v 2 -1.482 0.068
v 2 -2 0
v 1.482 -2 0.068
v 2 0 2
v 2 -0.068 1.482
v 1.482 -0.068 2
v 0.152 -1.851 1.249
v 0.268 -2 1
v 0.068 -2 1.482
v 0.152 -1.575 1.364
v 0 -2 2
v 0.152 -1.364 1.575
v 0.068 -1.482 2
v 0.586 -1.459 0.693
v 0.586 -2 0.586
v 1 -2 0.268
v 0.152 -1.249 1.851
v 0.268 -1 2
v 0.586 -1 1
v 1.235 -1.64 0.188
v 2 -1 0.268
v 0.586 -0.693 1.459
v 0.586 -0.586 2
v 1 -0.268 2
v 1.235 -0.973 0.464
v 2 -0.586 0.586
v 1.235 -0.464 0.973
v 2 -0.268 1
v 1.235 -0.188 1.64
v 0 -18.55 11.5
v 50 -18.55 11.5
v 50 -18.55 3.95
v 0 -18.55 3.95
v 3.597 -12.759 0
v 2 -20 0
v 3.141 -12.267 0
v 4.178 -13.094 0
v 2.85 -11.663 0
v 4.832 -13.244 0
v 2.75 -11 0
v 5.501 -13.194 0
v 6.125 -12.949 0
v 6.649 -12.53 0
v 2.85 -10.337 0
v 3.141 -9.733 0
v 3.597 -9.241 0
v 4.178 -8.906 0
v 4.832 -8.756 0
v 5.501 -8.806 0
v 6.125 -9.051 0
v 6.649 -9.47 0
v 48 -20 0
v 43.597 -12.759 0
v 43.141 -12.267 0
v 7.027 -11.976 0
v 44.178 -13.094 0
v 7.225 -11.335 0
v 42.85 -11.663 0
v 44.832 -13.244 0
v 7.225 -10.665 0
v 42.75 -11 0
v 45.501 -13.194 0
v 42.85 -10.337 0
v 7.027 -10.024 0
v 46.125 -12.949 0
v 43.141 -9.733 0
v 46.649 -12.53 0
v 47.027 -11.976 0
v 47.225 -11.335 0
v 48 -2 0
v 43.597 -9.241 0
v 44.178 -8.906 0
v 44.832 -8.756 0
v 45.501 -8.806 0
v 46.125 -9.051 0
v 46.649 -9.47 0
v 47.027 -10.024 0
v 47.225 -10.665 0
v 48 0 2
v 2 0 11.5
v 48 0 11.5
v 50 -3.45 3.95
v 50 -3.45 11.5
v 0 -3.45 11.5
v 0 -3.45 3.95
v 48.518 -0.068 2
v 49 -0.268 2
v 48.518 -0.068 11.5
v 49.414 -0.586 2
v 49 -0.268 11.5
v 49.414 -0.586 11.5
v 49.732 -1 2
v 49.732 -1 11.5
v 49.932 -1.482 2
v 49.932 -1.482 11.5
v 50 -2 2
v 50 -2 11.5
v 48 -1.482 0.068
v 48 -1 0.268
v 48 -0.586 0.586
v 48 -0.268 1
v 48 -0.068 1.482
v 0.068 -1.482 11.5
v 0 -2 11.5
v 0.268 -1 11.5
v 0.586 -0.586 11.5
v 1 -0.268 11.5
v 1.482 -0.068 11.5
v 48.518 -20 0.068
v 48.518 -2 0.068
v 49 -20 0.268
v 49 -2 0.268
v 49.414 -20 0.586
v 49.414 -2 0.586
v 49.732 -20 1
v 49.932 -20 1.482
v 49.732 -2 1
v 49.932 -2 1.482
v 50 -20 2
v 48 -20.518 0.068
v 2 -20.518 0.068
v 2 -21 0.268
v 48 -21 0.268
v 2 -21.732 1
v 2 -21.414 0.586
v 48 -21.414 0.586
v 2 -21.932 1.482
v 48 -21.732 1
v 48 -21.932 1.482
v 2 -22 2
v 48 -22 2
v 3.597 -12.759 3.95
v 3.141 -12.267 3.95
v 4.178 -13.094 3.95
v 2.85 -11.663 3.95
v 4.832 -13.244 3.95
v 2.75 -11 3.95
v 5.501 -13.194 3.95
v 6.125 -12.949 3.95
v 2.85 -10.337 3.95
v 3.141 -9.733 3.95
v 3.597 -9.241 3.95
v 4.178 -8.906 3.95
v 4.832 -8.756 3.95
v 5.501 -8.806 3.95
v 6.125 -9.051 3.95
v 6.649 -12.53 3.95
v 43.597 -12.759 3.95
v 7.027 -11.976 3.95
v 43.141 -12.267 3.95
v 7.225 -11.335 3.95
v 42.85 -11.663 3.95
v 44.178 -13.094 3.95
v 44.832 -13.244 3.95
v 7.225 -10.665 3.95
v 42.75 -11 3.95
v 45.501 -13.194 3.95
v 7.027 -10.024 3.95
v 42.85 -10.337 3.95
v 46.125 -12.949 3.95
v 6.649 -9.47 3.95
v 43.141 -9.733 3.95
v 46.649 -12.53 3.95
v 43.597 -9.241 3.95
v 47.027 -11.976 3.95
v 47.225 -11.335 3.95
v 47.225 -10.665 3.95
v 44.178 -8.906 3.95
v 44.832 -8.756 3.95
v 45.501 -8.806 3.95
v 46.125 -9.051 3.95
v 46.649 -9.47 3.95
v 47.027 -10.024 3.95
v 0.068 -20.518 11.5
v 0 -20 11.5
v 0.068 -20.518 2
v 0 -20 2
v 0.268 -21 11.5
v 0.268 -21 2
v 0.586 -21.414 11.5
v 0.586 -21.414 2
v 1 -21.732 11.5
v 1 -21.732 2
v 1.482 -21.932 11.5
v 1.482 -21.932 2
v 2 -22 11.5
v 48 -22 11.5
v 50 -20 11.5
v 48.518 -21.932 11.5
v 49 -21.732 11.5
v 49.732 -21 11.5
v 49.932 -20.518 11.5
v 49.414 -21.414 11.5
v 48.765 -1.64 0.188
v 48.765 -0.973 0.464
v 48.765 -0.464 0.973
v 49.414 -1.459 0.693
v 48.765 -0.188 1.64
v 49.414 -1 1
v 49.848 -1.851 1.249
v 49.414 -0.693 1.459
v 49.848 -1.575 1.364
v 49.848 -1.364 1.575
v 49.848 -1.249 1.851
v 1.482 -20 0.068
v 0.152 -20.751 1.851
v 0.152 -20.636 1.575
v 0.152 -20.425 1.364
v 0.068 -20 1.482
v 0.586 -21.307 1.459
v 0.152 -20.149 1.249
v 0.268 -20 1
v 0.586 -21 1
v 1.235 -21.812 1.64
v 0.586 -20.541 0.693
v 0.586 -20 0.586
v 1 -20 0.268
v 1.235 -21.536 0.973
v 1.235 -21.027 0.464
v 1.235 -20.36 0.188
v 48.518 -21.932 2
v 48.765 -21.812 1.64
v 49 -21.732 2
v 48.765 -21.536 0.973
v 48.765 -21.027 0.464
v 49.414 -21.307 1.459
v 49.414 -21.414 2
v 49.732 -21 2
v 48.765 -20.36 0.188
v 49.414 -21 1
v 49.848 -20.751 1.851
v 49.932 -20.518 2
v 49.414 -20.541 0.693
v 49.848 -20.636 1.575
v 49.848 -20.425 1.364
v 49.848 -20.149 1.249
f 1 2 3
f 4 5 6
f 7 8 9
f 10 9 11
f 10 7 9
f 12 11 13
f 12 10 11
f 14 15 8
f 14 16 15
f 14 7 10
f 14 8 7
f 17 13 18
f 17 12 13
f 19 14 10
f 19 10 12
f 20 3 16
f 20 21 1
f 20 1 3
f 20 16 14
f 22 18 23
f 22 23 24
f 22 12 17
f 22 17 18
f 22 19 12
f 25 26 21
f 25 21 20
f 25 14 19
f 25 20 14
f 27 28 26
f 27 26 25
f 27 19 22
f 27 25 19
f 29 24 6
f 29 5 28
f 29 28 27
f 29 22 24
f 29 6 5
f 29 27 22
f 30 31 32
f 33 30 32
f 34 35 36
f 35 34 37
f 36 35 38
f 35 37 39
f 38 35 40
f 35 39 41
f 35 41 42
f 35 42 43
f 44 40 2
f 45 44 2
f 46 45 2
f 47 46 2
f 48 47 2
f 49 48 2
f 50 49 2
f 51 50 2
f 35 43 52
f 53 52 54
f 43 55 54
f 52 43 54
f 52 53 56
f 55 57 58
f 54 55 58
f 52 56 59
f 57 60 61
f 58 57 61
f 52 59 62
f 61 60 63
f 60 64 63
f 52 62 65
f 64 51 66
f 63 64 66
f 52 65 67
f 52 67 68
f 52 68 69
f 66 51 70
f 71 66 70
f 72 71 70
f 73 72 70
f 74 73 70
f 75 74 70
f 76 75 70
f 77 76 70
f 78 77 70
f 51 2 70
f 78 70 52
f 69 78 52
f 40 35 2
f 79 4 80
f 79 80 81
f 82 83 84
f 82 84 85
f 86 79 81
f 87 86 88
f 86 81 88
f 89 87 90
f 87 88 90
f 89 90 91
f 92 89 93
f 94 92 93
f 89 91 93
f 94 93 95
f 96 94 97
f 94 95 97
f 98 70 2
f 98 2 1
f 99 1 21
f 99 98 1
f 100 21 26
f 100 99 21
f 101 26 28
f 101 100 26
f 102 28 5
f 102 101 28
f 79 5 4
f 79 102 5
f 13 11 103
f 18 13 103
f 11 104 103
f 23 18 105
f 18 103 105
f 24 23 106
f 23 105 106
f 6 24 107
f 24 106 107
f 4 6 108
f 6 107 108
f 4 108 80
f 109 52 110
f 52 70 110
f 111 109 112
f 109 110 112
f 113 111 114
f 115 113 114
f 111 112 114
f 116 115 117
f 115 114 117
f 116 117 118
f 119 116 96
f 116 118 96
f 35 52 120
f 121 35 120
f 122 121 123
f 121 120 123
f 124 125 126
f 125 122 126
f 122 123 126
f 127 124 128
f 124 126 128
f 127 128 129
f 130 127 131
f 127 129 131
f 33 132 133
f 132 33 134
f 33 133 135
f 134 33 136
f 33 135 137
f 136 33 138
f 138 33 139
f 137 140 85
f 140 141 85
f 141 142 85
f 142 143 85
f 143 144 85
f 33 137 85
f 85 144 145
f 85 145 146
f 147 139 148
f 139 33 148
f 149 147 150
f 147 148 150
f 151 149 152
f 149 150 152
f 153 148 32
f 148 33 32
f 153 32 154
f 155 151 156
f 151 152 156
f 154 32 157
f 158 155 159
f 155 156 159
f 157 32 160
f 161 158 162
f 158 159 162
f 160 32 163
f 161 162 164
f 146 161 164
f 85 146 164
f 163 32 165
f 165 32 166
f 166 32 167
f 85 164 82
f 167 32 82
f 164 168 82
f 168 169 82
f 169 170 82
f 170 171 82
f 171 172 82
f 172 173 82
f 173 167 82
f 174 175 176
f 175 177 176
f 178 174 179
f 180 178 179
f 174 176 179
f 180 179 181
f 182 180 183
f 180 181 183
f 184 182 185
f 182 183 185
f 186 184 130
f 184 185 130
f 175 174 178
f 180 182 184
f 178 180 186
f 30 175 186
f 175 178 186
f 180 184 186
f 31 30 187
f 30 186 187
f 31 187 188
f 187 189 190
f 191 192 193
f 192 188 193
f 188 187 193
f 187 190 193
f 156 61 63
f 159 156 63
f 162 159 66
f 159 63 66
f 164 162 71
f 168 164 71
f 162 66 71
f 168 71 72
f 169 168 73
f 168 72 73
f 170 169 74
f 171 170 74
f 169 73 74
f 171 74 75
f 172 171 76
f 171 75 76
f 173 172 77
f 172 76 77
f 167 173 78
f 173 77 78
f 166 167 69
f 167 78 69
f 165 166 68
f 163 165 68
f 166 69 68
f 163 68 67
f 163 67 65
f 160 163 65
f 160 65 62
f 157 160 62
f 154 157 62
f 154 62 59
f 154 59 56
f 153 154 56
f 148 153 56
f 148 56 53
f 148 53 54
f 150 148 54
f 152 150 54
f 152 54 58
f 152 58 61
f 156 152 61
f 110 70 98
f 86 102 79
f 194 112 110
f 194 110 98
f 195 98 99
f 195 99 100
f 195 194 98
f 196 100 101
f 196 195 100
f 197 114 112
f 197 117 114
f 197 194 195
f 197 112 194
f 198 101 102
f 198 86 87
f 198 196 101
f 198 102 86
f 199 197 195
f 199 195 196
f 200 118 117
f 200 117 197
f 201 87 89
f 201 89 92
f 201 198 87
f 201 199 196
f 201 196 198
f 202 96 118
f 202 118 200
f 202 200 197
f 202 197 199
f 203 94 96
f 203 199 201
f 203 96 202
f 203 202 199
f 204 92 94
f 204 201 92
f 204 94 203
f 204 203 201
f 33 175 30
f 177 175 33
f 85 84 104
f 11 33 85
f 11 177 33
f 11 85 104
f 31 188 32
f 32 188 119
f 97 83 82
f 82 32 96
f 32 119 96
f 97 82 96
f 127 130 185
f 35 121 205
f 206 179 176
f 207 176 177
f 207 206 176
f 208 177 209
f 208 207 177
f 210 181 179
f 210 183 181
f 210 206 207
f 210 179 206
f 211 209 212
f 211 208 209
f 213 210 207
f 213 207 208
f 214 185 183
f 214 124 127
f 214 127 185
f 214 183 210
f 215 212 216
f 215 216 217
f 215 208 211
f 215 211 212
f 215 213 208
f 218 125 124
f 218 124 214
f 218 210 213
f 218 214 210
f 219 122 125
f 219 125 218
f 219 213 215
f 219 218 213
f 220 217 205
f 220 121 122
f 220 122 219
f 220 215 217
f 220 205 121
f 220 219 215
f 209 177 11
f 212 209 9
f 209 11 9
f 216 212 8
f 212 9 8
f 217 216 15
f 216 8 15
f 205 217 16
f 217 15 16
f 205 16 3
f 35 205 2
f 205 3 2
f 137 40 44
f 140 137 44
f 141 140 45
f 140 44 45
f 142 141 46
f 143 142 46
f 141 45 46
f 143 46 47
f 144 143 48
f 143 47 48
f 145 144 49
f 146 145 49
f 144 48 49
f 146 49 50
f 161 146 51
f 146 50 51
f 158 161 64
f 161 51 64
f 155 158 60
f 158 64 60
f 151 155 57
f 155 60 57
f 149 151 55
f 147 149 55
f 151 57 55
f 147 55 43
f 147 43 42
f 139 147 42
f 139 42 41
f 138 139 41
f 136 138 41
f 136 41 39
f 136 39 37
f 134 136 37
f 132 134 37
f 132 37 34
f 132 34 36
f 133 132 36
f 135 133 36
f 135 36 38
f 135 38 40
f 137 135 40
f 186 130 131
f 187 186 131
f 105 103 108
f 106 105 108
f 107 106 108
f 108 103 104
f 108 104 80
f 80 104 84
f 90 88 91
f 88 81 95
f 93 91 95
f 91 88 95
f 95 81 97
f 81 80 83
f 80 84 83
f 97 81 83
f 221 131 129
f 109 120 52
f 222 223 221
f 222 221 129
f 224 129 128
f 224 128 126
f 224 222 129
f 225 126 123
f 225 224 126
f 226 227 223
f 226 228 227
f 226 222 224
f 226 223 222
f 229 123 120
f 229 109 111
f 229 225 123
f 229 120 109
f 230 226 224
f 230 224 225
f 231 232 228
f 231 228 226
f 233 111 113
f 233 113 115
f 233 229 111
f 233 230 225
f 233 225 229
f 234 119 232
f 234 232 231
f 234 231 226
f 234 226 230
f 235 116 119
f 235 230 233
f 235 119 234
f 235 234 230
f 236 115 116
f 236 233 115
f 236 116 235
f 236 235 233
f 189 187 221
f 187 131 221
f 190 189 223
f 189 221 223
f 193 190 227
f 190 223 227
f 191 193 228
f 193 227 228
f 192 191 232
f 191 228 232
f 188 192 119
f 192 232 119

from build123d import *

# Parameters (mm, degrees)
SKETCH_1_W          = 50
SKETCH_1_H          = 22
EXTRUDE_1_DEPTH     = 23
SKETCH_2_W          = 15.1
SKETCH_2_H          = 15.1
CUT_EXTRUDE_1_DEPTH = 77
SKETCH_3_R          = 2.25
CUT_EXTRUDE_2_DEPTH = 49
SKETCH_4_W          = 50
SKETCH_4_H          = 11.5
CUT_EXTRUDE_3_DEPTH = 49
FILLET_1_R          = 2
FILLET_2_R          = 2


with BuildPart() as part:
    # 草图1 → 凸台-拉伸1 (new body)
    with BuildSketch(Plane.XY):
        with Locations((25, -11)):
            Rectangle(SKETCH_1_W, SKETCH_1_H)
    extrude(amount=EXTRUDE_1_DEPTH)

    # 草图2 → 切除-拉伸1 (cut)
    with BuildSketch(Plane(origin=(50, 0, 0), x_dir=(0, 0, -1), z_dir=(1, 0, 0))):
        with Locations((-11.5, -11)):
            Rectangle(SKETCH_2_W, SKETCH_2_H)
    extrude(amount=-CUT_EXTRUDE_1_DEPTH, mode=Mode.SUBTRACT)

    # 草图3 → 切除-拉伸2 (cut)
    with BuildSketch(Plane(origin=(0, 0, 0), x_dir=(-1, 0, 0), z_dir=(0, 0, -1))):
        with Locations((-45, -11)):
            Circle(SKETCH_3_R)
        with Locations((-5, -11)):
            Circle(SKETCH_3_R)
    extrude(amount=-CUT_EXTRUDE_2_DEPTH, mode=Mode.SUBTRACT)

    # 草图4 → 切除-拉伸3 (cut)
    with BuildSketch(Plane.XZ.offset(22)):
        with Locations((25, 17.25)):
            Rectangle(SKETCH_4_W, SKETCH_4_H)
    extrude(amount=-CUT_EXTRUDE_3_DEPTH, mode=Mode.SUBTRACT)

    # 圆角1
    fillet_1_edges = [part.edges().sort_by_distance(p)[0] for p in [
        (25, 0, 0),
        (25, -22, 0),
    ]]
    fillet(fillet_1_edges, radius=FILLET_1_R)

    # 圆角2
    fillet_2_edges = [part.edges().sort_by_distance(p)[0] for p in [
        (0, 0, 6.75),
        (50, 0, 6.75),
        (50, -22, 6.75),
        (0, -22, 6.75),
        (0, -11, 0),
        (0, -21.414213562, 0.585786438),
        (0, -0.585786438, 0.585786438),
        (50, -11, 0),
        (50, -21.414213562, 0.585786438),
        (50, -0.585786438, 0.585786438),
    ]]
    fillet(fillet_2_edges, radius=FILLET_2_R)


solid = part.part
